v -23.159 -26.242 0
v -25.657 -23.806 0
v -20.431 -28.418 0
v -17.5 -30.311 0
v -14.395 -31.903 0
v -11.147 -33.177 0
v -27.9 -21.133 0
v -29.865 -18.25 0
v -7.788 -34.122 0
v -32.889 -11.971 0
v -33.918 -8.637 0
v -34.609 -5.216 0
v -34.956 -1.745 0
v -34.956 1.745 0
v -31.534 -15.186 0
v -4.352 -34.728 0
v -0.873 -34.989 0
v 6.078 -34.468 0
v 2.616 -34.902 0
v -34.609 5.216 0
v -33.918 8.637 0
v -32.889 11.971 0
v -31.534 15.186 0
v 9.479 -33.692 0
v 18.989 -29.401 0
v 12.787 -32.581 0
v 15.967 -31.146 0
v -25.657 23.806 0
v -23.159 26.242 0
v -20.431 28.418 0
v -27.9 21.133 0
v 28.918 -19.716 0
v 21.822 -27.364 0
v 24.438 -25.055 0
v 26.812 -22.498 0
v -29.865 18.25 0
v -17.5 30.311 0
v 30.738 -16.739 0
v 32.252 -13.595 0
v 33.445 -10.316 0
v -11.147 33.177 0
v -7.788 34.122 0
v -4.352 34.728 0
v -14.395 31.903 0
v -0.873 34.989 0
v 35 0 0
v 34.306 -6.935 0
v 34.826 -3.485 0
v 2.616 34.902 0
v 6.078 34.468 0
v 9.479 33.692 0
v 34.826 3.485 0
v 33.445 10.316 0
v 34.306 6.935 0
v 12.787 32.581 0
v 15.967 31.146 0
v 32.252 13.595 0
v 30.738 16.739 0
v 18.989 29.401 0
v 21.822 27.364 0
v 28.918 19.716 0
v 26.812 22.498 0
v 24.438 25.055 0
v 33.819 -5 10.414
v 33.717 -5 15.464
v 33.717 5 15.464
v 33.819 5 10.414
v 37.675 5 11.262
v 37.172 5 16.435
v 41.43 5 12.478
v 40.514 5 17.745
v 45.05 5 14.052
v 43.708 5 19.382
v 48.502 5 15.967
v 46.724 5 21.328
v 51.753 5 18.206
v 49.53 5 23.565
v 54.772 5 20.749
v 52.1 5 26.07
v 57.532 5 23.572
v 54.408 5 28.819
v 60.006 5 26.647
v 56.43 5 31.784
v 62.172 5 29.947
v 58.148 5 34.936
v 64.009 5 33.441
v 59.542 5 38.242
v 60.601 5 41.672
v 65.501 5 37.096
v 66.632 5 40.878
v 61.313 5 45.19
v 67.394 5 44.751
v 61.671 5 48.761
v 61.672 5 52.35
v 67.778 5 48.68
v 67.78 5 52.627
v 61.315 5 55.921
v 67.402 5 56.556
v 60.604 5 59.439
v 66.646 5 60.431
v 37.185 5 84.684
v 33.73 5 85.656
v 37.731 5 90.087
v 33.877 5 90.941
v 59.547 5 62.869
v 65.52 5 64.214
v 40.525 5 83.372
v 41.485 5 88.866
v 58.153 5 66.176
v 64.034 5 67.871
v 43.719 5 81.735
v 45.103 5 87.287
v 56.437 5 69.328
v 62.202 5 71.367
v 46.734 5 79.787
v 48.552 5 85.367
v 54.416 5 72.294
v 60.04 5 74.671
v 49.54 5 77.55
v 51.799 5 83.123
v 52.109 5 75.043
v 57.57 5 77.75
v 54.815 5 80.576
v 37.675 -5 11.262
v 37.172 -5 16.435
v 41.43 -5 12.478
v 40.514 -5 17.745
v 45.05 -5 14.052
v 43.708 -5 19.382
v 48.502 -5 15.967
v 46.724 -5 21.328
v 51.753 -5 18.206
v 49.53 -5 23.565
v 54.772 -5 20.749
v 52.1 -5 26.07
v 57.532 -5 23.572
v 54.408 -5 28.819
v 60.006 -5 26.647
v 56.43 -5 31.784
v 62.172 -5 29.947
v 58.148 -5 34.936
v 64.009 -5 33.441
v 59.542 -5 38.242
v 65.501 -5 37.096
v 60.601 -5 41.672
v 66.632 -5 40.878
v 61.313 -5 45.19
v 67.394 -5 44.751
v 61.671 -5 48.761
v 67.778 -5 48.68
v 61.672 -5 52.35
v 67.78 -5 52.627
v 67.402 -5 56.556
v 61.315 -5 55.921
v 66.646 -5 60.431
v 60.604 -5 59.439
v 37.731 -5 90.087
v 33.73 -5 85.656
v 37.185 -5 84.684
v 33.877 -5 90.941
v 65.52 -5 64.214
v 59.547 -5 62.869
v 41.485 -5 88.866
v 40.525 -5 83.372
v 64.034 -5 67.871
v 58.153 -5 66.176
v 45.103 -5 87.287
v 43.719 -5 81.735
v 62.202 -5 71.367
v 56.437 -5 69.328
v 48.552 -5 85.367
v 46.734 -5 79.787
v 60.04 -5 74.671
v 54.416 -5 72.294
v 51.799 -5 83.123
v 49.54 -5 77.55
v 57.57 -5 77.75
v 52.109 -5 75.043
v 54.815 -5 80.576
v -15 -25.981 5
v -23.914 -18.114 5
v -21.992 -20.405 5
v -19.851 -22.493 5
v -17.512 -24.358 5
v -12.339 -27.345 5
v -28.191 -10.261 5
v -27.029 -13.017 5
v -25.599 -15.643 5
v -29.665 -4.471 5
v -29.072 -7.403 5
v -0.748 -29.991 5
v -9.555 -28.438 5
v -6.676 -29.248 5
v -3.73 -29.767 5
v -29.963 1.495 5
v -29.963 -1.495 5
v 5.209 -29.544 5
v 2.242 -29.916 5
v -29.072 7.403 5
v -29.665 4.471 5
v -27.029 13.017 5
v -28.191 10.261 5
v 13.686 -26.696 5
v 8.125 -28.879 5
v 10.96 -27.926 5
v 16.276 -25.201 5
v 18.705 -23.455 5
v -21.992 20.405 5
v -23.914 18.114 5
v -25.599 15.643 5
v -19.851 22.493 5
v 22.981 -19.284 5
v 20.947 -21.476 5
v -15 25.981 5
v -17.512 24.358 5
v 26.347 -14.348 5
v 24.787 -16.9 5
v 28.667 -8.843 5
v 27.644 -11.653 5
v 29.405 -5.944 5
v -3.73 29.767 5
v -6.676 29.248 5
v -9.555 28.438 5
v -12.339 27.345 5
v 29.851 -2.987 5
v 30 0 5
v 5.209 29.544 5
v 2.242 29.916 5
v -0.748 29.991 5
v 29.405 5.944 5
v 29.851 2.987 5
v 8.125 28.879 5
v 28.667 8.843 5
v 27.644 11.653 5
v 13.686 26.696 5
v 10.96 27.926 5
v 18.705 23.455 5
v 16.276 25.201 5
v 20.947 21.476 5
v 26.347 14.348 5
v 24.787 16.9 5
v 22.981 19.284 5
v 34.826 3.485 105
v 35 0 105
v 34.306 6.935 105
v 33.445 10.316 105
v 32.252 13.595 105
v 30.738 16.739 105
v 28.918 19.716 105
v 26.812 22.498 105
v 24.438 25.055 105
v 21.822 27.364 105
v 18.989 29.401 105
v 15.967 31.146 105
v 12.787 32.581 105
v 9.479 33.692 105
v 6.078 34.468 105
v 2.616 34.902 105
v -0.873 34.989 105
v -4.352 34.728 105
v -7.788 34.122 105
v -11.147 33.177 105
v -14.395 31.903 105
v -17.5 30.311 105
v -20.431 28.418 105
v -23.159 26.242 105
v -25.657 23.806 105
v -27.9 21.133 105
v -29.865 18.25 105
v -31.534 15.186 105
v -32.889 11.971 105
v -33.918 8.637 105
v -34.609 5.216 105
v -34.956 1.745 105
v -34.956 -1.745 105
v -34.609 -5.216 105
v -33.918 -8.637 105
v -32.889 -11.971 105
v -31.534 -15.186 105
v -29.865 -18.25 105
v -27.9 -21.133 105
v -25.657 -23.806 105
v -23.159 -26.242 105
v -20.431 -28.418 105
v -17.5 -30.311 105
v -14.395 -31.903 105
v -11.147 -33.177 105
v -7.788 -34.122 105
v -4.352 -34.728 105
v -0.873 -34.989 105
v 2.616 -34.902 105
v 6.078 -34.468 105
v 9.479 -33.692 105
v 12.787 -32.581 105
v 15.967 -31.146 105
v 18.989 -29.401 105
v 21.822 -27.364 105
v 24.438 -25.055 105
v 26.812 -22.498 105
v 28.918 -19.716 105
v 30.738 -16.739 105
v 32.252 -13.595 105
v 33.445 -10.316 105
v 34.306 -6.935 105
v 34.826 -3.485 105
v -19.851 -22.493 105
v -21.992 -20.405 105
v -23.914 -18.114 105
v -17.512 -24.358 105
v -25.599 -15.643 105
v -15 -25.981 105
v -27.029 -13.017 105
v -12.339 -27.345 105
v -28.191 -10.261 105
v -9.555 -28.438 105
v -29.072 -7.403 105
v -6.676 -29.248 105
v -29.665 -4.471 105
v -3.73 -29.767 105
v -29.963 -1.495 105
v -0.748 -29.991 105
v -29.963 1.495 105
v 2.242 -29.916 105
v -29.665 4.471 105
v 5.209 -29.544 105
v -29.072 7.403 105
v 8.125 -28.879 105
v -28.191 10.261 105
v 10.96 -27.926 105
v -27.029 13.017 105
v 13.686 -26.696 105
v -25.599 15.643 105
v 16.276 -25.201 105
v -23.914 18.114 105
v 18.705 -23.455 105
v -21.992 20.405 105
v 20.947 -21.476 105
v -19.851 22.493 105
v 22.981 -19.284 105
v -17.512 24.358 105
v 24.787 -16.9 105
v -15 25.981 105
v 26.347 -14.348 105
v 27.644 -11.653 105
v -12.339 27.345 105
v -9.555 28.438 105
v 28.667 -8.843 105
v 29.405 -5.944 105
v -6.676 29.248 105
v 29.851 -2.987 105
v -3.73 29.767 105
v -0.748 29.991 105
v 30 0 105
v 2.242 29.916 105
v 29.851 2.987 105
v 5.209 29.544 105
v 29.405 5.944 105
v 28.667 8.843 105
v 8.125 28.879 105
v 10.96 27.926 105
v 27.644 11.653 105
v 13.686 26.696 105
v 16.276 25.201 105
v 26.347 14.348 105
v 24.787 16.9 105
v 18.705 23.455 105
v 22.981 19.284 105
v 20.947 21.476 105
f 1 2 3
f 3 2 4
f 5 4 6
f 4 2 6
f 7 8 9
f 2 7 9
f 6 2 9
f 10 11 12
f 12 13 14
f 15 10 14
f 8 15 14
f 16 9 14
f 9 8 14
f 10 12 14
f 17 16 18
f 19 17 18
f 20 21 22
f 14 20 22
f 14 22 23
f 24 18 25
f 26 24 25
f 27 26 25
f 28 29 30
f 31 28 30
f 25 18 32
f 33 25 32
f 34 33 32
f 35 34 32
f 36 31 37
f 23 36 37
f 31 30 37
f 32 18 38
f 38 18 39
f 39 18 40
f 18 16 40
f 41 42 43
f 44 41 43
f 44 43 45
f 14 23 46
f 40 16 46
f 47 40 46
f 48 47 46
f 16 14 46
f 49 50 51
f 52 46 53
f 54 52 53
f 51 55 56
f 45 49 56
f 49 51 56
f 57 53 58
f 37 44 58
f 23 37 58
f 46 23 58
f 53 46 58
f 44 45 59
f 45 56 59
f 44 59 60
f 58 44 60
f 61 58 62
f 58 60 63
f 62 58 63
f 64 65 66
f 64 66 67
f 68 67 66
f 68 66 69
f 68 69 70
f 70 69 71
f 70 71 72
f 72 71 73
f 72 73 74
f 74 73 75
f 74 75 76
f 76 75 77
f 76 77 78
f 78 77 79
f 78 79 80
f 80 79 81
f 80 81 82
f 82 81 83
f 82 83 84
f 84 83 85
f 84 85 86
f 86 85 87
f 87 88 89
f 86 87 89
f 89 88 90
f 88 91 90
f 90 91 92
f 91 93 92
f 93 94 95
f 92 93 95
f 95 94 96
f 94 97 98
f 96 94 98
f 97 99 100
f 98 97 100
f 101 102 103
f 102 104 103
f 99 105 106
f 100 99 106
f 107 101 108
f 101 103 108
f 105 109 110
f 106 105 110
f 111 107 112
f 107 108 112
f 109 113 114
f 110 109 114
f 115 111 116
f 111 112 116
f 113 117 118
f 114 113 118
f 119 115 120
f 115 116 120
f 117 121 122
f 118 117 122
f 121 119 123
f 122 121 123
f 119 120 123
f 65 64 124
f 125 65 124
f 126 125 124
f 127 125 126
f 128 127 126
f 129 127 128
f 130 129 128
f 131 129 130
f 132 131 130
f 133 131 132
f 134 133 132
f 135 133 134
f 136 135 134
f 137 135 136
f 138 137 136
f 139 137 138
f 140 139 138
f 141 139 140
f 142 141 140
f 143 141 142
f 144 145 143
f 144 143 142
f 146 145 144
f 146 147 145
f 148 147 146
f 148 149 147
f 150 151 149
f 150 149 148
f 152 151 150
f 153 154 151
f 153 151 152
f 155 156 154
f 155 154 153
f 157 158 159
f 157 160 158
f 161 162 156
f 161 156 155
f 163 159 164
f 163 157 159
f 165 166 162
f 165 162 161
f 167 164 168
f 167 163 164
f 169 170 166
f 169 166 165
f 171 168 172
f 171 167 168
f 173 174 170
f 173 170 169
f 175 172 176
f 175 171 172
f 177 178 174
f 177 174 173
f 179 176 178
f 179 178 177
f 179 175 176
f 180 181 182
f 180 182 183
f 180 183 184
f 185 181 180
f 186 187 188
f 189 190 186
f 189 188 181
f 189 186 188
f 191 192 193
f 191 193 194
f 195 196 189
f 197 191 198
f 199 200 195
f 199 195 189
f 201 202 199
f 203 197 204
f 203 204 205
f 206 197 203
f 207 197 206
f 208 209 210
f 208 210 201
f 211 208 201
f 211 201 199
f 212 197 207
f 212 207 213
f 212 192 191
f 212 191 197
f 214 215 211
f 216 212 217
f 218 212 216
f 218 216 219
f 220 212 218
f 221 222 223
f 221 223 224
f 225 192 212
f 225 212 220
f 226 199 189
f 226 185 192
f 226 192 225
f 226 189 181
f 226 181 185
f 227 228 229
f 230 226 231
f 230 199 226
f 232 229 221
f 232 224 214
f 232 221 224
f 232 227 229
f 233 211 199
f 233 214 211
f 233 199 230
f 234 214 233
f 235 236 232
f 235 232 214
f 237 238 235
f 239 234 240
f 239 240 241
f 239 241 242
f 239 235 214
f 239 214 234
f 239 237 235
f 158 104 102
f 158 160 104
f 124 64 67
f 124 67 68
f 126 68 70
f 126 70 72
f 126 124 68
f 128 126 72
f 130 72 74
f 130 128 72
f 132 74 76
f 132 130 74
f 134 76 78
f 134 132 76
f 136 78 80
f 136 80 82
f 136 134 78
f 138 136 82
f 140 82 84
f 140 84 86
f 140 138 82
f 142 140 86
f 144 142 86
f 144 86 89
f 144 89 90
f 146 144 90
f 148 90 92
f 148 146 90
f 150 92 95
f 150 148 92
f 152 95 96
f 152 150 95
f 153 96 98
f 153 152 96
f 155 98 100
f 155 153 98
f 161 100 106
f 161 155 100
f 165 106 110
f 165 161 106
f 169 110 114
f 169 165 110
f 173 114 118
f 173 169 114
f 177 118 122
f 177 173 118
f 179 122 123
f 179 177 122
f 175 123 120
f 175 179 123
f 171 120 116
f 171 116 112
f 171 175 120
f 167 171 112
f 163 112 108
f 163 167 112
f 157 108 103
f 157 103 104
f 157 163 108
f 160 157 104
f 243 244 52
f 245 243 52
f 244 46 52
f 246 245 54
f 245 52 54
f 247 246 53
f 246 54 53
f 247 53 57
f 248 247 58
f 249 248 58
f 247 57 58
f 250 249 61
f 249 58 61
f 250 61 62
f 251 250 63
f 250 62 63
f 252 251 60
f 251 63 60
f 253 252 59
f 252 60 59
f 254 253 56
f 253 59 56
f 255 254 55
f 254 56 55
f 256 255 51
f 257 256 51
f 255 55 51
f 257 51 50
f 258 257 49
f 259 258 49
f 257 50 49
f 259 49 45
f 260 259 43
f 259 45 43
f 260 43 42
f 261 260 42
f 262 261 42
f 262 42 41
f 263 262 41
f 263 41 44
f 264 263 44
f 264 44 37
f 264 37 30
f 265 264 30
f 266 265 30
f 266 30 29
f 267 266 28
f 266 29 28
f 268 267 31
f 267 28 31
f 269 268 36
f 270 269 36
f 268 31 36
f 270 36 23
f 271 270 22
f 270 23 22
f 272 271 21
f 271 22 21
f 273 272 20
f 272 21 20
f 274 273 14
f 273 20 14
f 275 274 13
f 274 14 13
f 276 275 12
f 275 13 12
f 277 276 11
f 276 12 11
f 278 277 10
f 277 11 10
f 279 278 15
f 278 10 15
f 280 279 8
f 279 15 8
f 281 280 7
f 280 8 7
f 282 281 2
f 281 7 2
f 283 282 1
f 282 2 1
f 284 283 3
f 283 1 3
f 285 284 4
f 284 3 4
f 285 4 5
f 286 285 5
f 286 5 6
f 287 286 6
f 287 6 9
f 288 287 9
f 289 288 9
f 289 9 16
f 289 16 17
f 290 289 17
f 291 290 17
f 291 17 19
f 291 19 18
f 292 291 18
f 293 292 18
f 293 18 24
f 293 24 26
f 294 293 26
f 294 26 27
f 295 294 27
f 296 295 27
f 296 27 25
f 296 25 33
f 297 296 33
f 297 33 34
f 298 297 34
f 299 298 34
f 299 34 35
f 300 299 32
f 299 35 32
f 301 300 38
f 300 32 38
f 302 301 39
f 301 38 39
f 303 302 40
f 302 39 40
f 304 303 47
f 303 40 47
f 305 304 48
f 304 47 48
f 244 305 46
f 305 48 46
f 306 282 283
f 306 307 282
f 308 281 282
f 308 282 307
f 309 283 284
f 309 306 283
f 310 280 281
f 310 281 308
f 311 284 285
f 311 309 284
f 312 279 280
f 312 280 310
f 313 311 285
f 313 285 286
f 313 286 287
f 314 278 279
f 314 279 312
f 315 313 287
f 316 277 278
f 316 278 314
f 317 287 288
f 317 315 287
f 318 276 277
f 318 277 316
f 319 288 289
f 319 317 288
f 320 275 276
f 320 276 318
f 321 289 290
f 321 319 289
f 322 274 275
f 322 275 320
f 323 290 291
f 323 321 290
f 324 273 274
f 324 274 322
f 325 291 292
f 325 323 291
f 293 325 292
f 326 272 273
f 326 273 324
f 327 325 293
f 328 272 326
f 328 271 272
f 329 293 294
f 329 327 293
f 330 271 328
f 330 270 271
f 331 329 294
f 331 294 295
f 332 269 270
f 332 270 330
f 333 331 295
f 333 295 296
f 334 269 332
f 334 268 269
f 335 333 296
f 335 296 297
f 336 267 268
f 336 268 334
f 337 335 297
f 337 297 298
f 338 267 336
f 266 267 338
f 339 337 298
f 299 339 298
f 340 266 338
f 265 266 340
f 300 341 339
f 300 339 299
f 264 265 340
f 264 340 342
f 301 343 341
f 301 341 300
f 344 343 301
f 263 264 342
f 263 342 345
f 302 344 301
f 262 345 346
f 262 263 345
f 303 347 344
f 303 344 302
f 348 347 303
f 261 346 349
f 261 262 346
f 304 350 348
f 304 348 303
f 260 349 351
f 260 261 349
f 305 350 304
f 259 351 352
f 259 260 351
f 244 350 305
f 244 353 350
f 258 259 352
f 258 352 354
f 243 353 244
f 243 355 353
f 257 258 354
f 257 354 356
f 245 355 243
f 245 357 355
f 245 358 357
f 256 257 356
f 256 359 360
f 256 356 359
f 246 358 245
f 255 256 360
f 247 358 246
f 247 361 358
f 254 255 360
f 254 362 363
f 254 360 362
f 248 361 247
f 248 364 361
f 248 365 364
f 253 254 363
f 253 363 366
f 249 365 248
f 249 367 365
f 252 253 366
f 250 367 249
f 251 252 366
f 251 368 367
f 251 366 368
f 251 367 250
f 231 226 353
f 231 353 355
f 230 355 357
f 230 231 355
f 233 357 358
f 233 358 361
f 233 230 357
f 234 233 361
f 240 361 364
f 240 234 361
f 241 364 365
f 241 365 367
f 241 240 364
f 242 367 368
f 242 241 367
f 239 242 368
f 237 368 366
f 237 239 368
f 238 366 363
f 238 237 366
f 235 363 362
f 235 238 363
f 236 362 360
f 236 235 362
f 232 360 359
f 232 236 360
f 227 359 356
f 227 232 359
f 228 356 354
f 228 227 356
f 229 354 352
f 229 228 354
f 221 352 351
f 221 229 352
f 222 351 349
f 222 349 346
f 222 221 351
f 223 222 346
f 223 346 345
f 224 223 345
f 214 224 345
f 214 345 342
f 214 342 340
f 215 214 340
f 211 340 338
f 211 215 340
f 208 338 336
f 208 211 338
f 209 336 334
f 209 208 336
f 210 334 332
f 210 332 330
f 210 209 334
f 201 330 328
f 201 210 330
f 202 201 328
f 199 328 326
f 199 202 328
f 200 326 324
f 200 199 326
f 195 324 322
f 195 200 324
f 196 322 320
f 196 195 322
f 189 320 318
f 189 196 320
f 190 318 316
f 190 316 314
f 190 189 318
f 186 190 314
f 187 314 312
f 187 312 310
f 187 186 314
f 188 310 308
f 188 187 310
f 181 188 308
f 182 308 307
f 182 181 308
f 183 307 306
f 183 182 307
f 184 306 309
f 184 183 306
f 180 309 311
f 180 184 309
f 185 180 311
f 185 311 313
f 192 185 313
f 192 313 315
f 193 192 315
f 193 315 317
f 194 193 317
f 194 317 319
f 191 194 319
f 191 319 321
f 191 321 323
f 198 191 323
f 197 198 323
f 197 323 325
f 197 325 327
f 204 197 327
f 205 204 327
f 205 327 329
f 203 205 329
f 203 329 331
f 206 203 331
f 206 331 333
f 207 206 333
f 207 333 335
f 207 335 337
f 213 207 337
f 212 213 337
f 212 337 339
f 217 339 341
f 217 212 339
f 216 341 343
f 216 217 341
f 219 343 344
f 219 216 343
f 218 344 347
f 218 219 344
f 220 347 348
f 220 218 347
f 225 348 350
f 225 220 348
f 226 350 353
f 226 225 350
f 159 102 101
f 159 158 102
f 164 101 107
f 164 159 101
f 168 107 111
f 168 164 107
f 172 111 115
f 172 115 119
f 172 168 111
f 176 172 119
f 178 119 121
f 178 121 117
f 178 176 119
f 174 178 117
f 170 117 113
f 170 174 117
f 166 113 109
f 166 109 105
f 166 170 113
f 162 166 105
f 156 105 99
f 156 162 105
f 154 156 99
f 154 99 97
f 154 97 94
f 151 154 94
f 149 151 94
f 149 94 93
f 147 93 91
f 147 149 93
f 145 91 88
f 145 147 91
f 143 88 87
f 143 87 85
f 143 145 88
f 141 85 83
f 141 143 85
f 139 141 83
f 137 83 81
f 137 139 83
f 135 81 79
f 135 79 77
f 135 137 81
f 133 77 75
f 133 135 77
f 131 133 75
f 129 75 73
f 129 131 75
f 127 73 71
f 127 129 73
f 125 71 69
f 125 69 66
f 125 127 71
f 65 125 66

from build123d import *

# Parameters (mm, degrees)
F0_R     = 35
F1_DEPTH = 5
F2_R     = 35
F2_R_2   = 30
F3_DEPTH = 100
F5_DEPTH = 5


with BuildPart() as f1:
    # F0 (on Top) → F1 (new body)
    with BuildSketch(Plane.XY):
        Circle(F0_R)
    extrude(amount=F1_DEPTH)

    # F2 (on face) → F3 (join)
    with BuildSketch(Plane.XY.offset(5)):
        Circle(F2_R)
        Circle(F2_R_2, mode=Mode.SUBTRACT)
    extrude(amount=F3_DEPTH)


with BuildPart() as f5:
    # F4 (on Front) → F5 (new body, symmetric)
    with BuildSketch(Plane.XZ):
        with BuildLine():
            ThreePointArc((33.729728, 85.655823), (61.71599, 50.555157), (33.717267, 15.464429))
            Line((33.717267, 15.464429), (33.819433, 10.414119))
            ThreePointArc((33.819433, 10.414119), (67.826746, 50.653269), (33.876944, 90.940952))
            Line((33.876944, 90.940952), (33.729728, 85.655823))
        make_face()
    extrude(amount=F5_DEPTH, both=True)


solid = Compound([f1.part, f5.part])
